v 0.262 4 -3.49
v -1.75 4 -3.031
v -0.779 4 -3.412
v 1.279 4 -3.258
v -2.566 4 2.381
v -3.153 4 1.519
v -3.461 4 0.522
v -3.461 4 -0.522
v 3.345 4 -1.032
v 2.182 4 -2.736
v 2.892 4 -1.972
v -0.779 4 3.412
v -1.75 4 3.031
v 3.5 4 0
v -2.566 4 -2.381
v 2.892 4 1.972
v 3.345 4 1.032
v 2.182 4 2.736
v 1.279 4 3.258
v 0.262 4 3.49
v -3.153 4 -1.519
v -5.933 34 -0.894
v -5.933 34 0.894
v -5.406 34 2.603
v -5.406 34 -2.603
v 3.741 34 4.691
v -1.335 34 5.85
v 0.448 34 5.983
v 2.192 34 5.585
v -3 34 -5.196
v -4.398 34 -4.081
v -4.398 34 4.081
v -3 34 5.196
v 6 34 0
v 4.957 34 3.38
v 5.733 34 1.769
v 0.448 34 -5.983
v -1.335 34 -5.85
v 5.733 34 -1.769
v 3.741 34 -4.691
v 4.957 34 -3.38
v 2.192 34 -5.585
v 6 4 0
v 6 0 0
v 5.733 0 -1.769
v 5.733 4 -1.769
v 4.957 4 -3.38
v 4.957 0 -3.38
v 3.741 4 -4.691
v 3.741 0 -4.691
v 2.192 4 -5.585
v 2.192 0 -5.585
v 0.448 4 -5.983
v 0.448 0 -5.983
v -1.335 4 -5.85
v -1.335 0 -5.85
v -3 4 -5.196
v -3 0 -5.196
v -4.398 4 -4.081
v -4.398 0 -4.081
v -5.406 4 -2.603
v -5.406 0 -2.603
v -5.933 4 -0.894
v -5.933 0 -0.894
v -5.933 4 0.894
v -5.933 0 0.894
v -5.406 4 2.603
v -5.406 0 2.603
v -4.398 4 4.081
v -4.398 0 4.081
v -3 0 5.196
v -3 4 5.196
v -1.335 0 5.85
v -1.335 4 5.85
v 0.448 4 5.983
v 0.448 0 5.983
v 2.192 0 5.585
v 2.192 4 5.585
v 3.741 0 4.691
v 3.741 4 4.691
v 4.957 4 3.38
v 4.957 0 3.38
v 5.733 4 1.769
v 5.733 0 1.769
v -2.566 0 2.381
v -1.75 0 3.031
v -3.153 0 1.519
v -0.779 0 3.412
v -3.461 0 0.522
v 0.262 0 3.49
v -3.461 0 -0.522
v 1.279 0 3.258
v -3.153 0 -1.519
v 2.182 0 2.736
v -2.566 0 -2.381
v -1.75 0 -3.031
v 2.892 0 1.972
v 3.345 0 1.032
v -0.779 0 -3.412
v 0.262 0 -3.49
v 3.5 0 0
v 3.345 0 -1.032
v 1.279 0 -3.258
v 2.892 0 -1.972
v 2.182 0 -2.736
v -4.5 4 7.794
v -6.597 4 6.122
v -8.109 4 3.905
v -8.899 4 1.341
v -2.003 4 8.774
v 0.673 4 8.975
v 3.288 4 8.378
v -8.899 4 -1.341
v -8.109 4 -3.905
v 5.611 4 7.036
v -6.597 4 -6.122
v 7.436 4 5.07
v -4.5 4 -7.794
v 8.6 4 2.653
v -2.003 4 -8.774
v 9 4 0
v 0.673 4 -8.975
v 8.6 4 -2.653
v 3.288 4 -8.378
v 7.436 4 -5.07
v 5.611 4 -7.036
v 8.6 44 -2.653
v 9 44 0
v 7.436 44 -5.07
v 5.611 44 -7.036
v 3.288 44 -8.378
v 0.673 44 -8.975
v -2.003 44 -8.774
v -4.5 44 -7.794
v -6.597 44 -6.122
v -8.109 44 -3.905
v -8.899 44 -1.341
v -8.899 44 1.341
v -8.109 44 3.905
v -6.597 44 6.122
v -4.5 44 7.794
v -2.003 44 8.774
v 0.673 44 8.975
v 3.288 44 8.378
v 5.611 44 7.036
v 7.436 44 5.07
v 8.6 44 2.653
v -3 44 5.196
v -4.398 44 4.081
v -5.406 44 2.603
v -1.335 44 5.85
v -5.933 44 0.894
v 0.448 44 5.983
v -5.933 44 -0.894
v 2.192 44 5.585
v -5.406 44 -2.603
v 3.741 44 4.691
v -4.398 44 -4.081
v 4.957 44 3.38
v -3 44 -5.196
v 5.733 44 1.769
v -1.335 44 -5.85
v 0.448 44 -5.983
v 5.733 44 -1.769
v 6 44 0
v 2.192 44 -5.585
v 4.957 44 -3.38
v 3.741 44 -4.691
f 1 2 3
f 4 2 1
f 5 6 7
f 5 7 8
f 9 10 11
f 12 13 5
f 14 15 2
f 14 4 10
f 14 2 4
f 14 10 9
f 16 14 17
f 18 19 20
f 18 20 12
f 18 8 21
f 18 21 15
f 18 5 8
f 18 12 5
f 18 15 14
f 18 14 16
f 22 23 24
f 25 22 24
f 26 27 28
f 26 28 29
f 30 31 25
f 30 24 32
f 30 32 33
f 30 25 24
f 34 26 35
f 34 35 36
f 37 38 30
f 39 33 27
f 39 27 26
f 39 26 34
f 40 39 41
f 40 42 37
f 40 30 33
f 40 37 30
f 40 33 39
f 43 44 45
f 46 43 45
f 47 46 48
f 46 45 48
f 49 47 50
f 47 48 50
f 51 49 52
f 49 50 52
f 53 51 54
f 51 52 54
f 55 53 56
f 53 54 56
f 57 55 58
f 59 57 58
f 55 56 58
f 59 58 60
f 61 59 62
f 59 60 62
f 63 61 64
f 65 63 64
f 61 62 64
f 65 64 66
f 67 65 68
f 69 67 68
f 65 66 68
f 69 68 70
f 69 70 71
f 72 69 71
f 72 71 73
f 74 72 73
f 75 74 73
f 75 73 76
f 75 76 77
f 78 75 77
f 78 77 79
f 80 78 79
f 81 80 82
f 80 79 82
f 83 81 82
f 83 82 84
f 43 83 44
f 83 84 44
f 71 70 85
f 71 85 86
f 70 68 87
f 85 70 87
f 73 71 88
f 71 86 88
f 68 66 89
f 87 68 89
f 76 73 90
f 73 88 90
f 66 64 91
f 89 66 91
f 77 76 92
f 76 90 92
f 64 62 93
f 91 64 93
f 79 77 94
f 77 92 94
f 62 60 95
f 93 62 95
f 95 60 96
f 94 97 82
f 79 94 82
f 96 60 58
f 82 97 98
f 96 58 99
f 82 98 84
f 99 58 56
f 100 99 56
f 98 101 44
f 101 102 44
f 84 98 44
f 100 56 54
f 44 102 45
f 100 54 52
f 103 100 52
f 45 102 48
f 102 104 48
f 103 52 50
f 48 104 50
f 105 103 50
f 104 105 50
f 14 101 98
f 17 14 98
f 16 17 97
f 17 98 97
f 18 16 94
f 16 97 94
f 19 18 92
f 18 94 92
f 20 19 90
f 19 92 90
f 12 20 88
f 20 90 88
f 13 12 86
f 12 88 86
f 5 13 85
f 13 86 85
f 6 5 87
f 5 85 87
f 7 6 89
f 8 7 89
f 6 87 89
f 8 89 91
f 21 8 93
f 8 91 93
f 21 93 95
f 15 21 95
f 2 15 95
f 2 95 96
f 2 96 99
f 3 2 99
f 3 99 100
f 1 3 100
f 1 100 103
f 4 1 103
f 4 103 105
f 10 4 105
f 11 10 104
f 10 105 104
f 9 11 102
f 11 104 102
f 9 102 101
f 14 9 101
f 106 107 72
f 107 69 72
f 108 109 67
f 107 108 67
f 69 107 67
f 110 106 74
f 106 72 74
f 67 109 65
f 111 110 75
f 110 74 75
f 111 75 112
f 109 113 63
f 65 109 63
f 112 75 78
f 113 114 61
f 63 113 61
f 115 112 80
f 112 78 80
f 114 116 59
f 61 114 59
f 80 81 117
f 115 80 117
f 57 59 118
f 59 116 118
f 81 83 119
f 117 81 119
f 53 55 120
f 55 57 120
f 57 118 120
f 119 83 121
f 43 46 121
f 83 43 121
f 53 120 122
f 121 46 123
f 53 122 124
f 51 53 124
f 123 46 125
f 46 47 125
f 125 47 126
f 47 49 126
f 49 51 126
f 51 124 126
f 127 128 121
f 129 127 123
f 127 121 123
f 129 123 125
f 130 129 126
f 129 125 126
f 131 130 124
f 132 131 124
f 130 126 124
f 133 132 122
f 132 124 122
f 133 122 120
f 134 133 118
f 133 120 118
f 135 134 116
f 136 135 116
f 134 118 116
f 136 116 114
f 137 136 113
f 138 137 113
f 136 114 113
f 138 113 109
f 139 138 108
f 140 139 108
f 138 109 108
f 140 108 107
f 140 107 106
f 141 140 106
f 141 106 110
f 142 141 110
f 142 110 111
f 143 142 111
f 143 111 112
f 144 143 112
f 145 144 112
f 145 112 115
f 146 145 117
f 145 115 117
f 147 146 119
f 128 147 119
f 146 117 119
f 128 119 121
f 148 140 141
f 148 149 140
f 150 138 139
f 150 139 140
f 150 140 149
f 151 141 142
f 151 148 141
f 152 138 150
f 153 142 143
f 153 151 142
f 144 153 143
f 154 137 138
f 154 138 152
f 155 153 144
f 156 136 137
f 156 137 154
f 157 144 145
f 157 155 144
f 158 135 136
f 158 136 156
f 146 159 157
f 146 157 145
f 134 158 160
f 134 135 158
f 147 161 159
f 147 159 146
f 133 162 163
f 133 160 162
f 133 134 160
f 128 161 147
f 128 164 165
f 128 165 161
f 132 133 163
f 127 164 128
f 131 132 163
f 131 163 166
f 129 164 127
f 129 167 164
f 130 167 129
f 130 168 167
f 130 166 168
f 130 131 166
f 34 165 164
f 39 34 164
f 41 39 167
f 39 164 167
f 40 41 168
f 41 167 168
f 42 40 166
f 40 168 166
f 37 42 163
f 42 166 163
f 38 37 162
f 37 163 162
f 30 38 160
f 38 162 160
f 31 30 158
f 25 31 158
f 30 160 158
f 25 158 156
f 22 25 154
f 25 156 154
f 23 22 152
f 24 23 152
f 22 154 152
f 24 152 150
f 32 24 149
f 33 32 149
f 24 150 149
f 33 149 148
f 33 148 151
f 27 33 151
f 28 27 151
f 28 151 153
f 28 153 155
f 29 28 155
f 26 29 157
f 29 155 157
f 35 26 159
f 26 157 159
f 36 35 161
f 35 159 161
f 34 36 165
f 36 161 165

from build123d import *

# Parameters (mm, degrees)
SKETCH1_R           = 6
BOSS_EXTRUDE1_DEPTH = 4
SKETCH2_R           = 9
BOSS_EXTRUDE2_DEPTH = 40
SKETCH3_R           = 3.5
CUT_EXTRUDE1_DEPTH  = 4
SKETCH4_R           = 6
CUT_EXTRUDE2_DEPTH  = 10


with BuildPart() as part:
    # Sketch1 → Boss-Extrude1 (new body)
    with BuildSketch(Plane(origin=(0, 0, 0), x_dir=(1, 0, 0), z_dir=(0, 1, 0))):
        Circle(SKETCH1_R)
    extrude(amount=BOSS_EXTRUDE1_DEPTH)

    # Sketch2 → Boss-Extrude2 (add)
    with BuildSketch(Plane(origin=(0, 4, 0), x_dir=(1, 0, 0), z_dir=(0, 1, 0))):
        Circle(SKETCH2_R)
    extrude(amount=BOSS_EXTRUDE2_DEPTH)

    # Sketch3 → Cut-Extrude1 (cut)
    with BuildSketch(Plane.XZ):
        Circle(SKETCH3_R)
    extrude(amount=-CUT_EXTRUDE1_DEPTH, mode=Mode.SUBTRACT)

    # Sketch4 → Cut-Extrude2 (cut)
    with BuildSketch(Plane(origin=(0, 44, 0), x_dir=(1, 0, 0), z_dir=(0, 1, 0))):
        Circle(SKETCH4_R)
    extrude(amount=-CUT_EXTRUDE2_DEPTH, mode=Mode.SUBTRACT)


solid = part.part
